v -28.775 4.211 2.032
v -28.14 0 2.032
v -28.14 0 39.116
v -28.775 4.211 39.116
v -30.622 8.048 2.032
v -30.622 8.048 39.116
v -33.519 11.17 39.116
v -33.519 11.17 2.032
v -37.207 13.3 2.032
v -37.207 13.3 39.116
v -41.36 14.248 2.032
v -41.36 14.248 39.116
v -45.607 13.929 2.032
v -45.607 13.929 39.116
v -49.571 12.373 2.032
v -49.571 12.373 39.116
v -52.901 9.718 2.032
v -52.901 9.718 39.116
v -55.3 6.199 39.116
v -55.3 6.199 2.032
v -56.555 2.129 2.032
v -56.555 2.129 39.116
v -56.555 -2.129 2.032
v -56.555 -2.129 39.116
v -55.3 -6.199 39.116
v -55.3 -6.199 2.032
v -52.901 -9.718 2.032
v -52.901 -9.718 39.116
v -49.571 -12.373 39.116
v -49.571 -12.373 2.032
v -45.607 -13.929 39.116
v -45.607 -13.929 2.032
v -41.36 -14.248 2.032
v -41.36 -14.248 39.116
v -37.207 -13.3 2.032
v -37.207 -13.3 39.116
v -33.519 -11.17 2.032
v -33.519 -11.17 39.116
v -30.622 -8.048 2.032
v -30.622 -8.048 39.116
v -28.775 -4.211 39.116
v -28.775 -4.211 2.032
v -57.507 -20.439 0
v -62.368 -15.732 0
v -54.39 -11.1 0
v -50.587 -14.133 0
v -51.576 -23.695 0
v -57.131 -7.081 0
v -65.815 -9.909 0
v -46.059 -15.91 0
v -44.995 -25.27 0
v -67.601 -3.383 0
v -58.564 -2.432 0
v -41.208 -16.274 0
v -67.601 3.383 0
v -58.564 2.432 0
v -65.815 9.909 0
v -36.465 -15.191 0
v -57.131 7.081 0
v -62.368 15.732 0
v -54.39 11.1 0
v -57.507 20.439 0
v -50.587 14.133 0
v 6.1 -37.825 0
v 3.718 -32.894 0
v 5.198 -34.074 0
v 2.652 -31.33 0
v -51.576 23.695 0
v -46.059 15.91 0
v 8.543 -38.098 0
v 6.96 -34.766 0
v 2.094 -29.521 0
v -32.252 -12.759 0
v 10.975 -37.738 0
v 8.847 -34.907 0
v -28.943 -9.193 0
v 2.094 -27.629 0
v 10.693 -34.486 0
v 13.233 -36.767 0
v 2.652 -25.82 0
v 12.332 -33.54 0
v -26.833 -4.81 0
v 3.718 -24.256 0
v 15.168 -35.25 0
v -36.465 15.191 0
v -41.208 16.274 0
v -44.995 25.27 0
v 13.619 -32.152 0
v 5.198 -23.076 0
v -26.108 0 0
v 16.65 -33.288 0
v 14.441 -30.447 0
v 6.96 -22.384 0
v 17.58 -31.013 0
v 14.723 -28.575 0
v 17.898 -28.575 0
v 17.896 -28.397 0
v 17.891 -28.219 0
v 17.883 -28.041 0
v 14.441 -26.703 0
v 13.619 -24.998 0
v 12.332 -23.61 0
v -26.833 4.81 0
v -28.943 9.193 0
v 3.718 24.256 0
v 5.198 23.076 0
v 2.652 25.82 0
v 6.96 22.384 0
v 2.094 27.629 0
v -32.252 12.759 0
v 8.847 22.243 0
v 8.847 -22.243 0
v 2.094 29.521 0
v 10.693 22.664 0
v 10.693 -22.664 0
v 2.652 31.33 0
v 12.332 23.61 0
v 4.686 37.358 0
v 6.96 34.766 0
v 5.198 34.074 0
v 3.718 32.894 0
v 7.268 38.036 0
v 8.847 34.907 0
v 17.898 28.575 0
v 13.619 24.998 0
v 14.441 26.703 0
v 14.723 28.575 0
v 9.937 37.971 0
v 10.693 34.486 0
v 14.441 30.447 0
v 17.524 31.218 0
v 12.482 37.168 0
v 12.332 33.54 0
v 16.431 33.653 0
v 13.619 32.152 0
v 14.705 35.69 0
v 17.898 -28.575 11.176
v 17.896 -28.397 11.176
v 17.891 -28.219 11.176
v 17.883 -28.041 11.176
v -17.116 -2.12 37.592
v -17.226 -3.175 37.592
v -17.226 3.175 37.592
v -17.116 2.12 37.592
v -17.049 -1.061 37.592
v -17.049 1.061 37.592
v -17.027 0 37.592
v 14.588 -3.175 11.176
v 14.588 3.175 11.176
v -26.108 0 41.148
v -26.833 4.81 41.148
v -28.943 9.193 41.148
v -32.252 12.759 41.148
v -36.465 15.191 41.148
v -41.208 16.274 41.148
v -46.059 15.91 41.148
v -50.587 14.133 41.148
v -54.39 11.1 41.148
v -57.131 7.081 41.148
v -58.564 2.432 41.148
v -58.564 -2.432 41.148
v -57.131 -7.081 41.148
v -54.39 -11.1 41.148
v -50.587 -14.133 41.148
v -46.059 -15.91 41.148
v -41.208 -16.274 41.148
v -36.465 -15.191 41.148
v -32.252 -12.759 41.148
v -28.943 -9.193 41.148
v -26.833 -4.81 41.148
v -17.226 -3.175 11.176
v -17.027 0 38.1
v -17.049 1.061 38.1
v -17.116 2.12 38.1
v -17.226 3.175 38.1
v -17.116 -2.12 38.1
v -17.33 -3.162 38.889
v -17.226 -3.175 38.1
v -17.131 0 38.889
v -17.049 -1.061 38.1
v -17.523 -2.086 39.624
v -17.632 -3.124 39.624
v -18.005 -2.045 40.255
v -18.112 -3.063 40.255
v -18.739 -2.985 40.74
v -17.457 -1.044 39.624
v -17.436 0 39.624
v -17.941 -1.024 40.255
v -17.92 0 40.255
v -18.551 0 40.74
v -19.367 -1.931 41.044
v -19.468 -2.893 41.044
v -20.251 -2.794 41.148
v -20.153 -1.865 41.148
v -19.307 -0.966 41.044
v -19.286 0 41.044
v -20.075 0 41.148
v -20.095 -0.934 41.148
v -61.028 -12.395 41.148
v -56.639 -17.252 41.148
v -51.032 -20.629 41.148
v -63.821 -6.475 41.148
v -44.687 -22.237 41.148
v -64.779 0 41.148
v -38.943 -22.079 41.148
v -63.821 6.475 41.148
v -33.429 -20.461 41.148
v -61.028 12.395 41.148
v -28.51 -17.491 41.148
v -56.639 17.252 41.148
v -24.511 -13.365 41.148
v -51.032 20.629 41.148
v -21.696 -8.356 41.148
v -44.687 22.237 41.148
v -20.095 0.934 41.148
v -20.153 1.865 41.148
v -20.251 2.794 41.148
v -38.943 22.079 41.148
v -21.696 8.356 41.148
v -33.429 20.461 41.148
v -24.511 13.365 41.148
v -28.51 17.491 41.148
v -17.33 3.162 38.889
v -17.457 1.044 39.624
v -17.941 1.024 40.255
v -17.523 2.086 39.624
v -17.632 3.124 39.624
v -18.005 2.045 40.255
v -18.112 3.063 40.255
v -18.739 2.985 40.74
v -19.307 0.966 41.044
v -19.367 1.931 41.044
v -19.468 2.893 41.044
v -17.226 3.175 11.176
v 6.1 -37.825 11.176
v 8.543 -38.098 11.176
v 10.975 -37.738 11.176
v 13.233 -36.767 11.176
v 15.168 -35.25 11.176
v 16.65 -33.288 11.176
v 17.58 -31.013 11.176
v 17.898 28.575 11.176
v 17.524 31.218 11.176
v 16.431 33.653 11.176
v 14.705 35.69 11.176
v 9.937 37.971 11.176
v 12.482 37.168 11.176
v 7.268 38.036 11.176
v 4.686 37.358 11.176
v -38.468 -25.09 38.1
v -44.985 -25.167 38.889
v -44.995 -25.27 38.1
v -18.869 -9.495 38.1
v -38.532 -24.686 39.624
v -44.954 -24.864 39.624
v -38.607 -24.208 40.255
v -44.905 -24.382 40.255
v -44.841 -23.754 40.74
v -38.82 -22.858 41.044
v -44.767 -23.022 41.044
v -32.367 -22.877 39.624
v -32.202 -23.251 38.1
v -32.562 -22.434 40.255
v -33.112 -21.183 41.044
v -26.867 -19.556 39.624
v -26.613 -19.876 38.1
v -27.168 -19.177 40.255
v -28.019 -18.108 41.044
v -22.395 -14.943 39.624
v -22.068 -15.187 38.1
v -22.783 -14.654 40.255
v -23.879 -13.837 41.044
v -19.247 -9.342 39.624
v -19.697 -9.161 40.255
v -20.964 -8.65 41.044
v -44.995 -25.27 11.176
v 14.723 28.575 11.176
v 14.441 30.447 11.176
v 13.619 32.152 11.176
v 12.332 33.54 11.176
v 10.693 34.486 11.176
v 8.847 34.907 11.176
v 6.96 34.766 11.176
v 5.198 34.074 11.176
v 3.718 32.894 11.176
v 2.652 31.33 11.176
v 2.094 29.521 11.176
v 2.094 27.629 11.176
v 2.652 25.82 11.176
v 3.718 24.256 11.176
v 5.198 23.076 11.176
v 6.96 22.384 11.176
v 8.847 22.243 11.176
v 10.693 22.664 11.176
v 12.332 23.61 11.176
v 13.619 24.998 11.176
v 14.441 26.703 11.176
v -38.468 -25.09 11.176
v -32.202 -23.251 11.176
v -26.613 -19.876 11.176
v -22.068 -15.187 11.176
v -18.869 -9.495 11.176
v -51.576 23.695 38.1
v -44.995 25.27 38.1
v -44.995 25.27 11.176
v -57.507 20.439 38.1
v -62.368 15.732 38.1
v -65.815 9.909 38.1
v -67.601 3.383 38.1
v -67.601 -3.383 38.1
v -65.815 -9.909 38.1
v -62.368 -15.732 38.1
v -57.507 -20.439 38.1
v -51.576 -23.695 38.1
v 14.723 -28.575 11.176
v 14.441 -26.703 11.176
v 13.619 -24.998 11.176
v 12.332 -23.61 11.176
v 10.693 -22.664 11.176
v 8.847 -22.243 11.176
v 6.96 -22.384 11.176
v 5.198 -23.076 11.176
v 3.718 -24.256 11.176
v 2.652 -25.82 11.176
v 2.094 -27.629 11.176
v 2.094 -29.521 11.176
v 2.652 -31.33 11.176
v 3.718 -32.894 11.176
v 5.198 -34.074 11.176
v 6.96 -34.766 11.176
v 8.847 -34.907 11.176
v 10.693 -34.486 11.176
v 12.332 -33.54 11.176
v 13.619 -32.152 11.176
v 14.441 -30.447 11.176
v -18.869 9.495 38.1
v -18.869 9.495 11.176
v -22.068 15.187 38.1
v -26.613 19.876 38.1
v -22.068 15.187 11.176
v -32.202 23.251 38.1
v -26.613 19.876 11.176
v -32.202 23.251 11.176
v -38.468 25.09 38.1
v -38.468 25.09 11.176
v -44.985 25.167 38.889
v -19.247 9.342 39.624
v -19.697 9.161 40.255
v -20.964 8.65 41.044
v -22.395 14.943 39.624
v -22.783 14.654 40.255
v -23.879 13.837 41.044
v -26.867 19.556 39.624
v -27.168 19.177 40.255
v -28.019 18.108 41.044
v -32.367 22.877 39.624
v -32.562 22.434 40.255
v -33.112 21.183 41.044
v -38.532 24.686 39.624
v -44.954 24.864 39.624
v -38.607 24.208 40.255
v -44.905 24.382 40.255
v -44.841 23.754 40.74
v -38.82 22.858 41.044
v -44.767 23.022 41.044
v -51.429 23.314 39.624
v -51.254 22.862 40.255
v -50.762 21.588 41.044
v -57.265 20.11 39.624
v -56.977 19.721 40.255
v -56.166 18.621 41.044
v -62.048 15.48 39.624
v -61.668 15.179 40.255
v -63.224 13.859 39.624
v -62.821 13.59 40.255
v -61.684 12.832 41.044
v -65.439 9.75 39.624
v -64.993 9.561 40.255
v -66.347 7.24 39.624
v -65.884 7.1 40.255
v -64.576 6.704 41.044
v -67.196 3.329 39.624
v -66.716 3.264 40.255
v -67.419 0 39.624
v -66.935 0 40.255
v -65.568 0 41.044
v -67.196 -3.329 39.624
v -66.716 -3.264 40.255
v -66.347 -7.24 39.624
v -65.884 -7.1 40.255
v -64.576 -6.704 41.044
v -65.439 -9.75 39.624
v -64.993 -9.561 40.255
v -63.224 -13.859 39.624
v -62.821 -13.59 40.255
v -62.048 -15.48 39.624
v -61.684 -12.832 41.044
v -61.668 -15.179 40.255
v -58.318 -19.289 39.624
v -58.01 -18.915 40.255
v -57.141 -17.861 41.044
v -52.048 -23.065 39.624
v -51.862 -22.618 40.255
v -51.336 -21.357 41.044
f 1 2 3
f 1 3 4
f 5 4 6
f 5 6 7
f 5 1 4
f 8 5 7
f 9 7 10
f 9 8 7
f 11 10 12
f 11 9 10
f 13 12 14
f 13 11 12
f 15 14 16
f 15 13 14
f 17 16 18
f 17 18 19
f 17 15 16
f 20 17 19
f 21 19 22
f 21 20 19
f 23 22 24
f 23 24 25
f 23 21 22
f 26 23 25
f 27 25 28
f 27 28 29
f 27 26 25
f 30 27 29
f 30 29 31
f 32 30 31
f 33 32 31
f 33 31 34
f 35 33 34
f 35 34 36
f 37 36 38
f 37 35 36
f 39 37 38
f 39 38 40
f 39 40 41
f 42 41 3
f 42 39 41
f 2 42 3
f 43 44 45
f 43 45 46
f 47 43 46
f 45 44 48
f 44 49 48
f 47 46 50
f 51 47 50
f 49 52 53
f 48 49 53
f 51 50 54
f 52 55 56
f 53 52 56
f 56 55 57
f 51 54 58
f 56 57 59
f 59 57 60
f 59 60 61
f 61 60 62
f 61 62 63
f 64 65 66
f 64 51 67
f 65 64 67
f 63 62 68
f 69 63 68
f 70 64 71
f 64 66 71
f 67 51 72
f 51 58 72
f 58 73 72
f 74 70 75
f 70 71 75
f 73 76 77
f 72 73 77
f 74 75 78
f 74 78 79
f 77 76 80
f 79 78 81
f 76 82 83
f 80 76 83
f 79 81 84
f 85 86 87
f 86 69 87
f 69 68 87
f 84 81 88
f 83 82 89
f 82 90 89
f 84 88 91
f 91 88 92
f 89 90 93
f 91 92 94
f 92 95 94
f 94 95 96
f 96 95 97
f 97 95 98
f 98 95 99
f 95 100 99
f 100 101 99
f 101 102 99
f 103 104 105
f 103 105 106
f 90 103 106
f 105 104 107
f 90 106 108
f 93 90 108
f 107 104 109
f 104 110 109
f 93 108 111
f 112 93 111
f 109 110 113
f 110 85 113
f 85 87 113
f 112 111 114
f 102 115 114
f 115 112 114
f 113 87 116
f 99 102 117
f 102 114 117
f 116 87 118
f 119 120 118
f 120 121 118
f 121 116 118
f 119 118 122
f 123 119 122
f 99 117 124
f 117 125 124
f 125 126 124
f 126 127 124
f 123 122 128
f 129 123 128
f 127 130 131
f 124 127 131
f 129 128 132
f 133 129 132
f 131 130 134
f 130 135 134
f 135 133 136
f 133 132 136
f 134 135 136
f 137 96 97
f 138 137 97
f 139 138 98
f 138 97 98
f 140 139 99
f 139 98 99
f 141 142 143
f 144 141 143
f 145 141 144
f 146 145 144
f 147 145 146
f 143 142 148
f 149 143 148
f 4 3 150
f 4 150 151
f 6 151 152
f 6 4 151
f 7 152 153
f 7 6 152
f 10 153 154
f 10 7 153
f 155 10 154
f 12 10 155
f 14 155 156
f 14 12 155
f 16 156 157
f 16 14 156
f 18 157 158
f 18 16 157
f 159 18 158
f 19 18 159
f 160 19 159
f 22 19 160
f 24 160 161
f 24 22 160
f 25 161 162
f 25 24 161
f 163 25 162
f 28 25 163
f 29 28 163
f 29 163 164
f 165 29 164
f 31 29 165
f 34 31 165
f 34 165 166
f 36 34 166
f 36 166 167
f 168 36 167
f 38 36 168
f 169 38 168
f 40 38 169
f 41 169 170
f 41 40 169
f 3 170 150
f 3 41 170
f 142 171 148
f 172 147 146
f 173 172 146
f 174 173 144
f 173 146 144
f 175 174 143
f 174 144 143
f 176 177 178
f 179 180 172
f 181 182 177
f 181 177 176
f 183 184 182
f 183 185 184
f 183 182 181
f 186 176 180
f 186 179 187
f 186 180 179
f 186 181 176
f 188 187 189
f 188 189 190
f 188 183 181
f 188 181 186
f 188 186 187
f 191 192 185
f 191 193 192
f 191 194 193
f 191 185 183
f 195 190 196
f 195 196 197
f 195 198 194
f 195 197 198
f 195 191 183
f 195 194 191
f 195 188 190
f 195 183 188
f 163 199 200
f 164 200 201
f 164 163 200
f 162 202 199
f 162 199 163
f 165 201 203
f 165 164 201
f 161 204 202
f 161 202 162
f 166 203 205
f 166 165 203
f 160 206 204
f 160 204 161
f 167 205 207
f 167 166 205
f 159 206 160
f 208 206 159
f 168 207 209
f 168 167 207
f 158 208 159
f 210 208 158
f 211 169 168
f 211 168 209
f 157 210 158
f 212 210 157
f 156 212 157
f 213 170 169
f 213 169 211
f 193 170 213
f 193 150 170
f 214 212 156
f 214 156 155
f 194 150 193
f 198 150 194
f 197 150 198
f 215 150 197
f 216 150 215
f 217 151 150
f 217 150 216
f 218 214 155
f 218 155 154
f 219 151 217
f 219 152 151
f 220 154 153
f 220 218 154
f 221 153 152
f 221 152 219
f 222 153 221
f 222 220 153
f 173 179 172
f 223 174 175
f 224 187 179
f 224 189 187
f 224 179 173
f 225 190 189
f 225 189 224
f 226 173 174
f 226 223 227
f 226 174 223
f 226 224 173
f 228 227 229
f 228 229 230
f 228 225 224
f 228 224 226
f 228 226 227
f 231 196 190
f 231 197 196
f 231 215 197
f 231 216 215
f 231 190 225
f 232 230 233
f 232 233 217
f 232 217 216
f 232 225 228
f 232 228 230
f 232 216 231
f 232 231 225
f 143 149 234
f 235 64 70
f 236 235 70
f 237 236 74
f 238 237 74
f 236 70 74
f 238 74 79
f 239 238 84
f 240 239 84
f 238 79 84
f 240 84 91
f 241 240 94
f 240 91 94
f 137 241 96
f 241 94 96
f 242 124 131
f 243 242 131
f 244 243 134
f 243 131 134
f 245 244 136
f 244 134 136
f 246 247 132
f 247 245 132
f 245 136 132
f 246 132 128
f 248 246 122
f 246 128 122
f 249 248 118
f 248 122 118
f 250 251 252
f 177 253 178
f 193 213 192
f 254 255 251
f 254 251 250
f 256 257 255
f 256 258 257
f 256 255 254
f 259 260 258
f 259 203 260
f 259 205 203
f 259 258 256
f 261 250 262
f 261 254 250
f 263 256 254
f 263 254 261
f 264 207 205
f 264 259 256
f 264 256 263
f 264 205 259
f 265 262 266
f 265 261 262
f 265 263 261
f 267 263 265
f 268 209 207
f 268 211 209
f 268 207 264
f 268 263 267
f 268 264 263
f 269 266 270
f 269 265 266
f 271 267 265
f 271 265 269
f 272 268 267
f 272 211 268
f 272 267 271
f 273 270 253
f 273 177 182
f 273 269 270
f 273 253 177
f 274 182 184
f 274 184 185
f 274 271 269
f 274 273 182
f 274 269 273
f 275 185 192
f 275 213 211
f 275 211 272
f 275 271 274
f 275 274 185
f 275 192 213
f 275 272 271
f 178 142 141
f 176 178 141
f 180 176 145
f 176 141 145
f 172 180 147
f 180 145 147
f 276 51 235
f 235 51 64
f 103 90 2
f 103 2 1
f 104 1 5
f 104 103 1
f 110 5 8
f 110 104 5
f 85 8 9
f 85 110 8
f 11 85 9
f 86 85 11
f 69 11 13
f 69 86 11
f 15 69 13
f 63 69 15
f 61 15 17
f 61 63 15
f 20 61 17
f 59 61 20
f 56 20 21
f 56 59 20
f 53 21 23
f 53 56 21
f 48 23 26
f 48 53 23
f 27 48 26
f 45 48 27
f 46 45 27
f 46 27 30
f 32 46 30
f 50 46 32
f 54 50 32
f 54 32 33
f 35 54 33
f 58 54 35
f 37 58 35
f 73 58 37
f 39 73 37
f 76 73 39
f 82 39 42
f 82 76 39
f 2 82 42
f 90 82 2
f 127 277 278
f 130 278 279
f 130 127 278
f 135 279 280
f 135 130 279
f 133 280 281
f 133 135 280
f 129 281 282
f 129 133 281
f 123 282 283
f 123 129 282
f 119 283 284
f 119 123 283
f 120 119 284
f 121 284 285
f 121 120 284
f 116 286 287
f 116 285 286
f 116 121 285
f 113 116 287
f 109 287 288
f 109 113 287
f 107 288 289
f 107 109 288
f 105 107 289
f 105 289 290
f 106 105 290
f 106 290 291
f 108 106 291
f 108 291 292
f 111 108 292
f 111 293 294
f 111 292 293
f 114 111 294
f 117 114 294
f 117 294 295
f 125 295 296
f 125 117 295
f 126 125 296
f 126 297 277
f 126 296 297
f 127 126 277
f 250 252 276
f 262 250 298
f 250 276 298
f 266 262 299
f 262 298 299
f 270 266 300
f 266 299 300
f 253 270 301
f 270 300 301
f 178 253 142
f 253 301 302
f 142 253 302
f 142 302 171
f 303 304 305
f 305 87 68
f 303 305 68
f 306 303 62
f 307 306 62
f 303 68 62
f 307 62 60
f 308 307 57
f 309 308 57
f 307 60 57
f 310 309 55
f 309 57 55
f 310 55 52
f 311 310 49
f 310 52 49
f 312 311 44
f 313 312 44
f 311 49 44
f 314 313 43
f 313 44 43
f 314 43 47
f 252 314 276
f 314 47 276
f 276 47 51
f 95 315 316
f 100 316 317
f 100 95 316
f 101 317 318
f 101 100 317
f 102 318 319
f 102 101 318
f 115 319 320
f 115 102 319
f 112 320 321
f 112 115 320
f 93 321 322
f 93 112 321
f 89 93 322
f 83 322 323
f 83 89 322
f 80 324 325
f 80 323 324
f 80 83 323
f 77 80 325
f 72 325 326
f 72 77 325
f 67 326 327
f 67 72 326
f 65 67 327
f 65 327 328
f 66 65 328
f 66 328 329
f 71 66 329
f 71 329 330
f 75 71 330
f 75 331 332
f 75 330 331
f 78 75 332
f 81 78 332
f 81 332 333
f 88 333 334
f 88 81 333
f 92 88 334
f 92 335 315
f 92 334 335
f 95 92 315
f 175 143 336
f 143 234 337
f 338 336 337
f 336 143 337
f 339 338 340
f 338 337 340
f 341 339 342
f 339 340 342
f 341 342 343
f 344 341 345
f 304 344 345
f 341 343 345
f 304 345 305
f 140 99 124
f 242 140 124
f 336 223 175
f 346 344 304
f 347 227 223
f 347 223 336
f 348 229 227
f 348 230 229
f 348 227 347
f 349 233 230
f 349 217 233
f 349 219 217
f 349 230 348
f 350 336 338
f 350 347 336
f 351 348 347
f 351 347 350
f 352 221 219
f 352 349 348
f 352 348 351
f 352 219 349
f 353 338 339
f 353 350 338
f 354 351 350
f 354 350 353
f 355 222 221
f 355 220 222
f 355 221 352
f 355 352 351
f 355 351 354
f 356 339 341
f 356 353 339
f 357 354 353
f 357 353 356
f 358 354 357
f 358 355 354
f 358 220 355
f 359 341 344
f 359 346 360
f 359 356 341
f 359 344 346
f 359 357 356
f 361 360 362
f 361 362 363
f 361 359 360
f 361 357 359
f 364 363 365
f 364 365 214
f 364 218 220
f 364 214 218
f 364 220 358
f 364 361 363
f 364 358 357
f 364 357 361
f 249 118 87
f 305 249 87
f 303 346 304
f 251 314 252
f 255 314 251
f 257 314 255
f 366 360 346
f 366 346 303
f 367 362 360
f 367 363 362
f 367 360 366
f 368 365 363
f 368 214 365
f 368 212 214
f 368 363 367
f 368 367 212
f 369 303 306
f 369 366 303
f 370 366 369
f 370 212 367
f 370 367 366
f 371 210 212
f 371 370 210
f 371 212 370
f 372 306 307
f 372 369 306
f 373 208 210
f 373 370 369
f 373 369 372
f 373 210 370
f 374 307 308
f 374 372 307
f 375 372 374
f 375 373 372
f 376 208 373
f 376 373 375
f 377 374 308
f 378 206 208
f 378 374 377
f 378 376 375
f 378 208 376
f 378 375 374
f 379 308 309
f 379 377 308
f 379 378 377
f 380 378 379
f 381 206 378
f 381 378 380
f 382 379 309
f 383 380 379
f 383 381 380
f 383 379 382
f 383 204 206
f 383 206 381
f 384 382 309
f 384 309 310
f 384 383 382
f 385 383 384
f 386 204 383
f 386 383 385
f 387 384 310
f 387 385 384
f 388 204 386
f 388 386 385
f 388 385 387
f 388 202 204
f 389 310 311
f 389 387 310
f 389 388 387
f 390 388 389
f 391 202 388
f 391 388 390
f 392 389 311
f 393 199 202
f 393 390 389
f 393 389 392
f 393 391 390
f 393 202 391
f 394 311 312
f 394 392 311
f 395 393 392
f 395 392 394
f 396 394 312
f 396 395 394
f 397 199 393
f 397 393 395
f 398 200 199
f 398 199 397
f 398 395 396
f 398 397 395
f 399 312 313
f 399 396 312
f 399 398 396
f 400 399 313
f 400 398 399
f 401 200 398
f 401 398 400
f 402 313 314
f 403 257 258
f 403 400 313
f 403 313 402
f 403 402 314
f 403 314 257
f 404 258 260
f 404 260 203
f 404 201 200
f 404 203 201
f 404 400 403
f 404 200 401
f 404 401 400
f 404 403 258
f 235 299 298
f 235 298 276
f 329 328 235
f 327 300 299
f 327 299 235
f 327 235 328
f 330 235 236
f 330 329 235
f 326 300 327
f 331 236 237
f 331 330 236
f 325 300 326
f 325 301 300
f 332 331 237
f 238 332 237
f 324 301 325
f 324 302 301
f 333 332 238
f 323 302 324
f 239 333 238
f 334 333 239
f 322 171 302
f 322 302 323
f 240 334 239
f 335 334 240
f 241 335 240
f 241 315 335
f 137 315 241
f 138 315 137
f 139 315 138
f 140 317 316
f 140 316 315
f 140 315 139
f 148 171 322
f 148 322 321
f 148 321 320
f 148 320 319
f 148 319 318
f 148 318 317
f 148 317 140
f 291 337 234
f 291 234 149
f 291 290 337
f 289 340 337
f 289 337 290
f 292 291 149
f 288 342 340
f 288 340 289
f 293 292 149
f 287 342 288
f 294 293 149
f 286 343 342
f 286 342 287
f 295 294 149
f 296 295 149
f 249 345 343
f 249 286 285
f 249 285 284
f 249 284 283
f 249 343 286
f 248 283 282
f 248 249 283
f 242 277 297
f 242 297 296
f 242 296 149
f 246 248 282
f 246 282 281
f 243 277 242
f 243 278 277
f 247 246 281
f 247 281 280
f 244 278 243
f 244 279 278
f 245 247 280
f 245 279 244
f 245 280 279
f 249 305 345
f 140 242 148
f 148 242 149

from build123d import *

# Parameters (mm, degrees)
F0_R     = 14.2875
F1_DEPTH = 41.148
F0_R_2   = 6.35
F2_DEPTH = 11.176
F3_DEPTH = 37.592
F5_DEPTH = 127
F6_DEPTH = 76.2
F7_R     = 3.048
F8_SIZE2 = 2.032
F8_SIZE  = 2.032
F9_SIZE2 = 2.032
F9_SIZE  = 2.032


# Not quite as in the source:
# - ends of sketch curves that miss each other by under 0.0002 mm in the source are joined


with BuildPart() as f1:
    # F0 (on Top) → F1 (new body)
    with BuildSketch(Plane.XY):
        with BuildLine():
            ThreePointArc((-17.226482478, 3.175), (-26.6125443992, 19.8759818106), (-44.9953409853, 25.2698432749))
            ThreePointArc((-44.9953409853, 25.2698432749), (-67.8272637159, 0), (-44.9953409853, -25.2698432749))
            ThreePointArc((-44.9953409853, -25.2698432749), (-26.6125443992, -19.8759818106), (-17.226482478, -3.175))
            Line((-17.226482478, -3.175), (-23.8334226287, -3.175))
            Line((-23.8334226287, -3.175), (-23.8334226287, 3.175))
            Line((-23.8334226287, 3.175), (-17.226482478, 3.175))
        make_face()
        with Locations((-42.4272637159, 0)):
            Circle(F0_R, mode=Mode.SUBTRACT)
        with BuildLine():
            ThreePointArc((-17.0272637159, 0), (-17.0771173313, 1.5906219786), (-17.226482478, 3.175))
            Line((-17.226482478, 3.175), (-23.8334226287, 3.175))
            Line((-23.8334226287, 3.175), (-23.8334226287, -3.175))
            Line((-23.8334226287, -3.175), (-17.226482478, -3.175))
            ThreePointArc((-17.226482478, -3.175), (-17.0771173313, -1.5906219786), (-17.0272637159, 0))
        make_face()
    extrude(amount=F1_DEPTH)

    # F0 (on Top) → F2 (join)
    with BuildSketch(Plane.XY):
        with BuildLine():
            Line((4.6864668266, 37.3577696364), (-44.9953409853, 25.2698432749))
            ThreePointArc((-44.9953409853, 25.2698432749), (-26.6125443992, 19.8759818106), (-17.226482478, 3.175))
            Line((-17.226482478, 3.175), (14.5881694606, 3.175))
            Line((14.5881694606, 3.175), (14.5881694606, -3.175))
            Line((14.5881694606, -3.175), (-17.226482478, -3.175))
            ThreePointArc((-17.226482478, -3.175), (-26.6125443992, -19.8759818106), (-44.9953409853, -25.2698432749))
            Line((-44.9953409853, -25.2698432749), (6.0998825197, -37.8248519321))
            ThreePointArc((6.0998825197, -37.8248519321), (2.2878291463, -21.247003676), (17.8827435435, -28.0407838216))
            Line((17.8827435435, -28.0407838216), (17.8977366181, 28.575))
            ThreePointArc((17.8977366181, 28.575), (3.0995063243, 20.6428709799), (4.6864668266, 37.3577696364))
        make_face()
        with BuildLine():
            ThreePointArc((17.8827435435, -28.0407838216), (2.2878291463, -21.247003676), (6.0998825197, -37.8248519321))
            ThreePointArc((6.0998825197, -37.8248519321), (14.2496697061, -36.0708174039), (17.8977362841, -28.575))
            ThreePointArc((17.8977362841, -28.575), (17.8939873612, -28.307786739), (17.8827435435, -28.0407838216))
        make_face()
        with Locations((8.3727362841, -28.575)):
            Circle(F0_R_2, mode=Mode.SUBTRACT)
        with BuildLine():
            ThreePointArc((4.6864668266, 37.3577696364), (3.0995063243, 20.6428709799), (17.8977362841, 28.575))
            ThreePointArc((17.8977362841, 28.575), (13.6459662439, 36.5071290201), (4.6864668266, 37.3577696364))
        make_face()
        with Locations((8.3727362841, 28.575)):
            Circle(F0_R_2, mode=Mode.SUBTRACT)
        with BuildLine():
            Line((14.5881694606, 3.175), (-17.226482478, 3.175))
            ThreePointArc((-17.226482478, 3.175), (-17.0771173313, 1.5906219786), (-17.0272637159, 0))
            ThreePointArc((-17.0272637159, 0), (-17.0771173313, -1.5906219786), (-17.226482478, -3.175))
            Line((-17.226482478, -3.175), (14.5881694606, -3.175))
            Line((14.5881694606, -3.175), (14.5881694606, 3.175))
        make_face()
        with Locations((8.3727362841, 28.575)):
            Circle(F0_R_2)
        with Locations((8.3727362841, -28.575)):
            Circle(F0_R_2)
        with BuildLine():
            ThreePointArc((-17.0272637159, 0), (-17.0771173313, 1.5906219786), (-17.226482478, 3.175))
            Line((-17.226482478, 3.175), (-23.8334226287, 3.175))
            Line((-23.8334226287, 3.175), (-23.8334226287, -3.175))
            Line((-23.8334226287, -3.175), (-17.226482478, -3.175))
            ThreePointArc((-17.226482478, -3.175), (-17.0771173313, -1.5906219786), (-17.0272637159, 0))
        make_face()
    extrude(amount=F2_DEPTH)

    # F0 (on Top) → F3 (join)
    with BuildSketch(Plane.XY):
        with BuildLine():
            Line((14.5881694606, 3.175), (-17.226482478, 3.175))
            ThreePointArc((-17.226482478, 3.175), (-17.0771173313, 1.5906219786), (-17.0272637159, 0))
            ThreePointArc((-17.0272637159, 0), (-17.0771173313, -1.5906219786), (-17.226482478, -3.175))
            Line((-17.226482478, -3.175), (14.5881694606, -3.175))
            Line((14.5881694606, -3.175), (14.5881694606, 3.175))
        make_face()
    extrude(amount=F3_DEPTH)

    # F4 (on face) → F5 (cut)
    with BuildSketch(Plane.XZ.offset(3.175)):
        Polygon((14.5881694606, 37.592), (-17.226482478, 37.592), (14.5881694606, 11.176), align=None)
    extrude(amount=-F5_DEPTH, mode=Mode.SUBTRACT)

    # F0 (on Top) → F6 (cut)
    with BuildSketch(Plane.XY):
        with Locations((8.3727362841, 28.575)):
            Circle(F0_R_2)
        with Locations((8.3727362841, -28.575)):
            Circle(F0_R_2)
    extrude(amount=F6_DEPTH, mode=Mode.SUBTRACT)

    # F7
    f7_edges = [f1.edges().sort_by_distance(p)[0] for p in [
        (-39.859186, -25.269843, 41.148),
    ]]
    fillet(f7_edges, radius=F7_R)

    # F8
    f8_edges = [f1.edges().sort_by_distance(p)[0] for p in [
        (-56.714764, 0, 41.148),
        (-40.167356, -22.237462, 41.148),
    ]]
    chamfer(f8_edges, length=F8_SIZE, length2=F8_SIZE2)

    # F9
    f9_edges = [f1.edges().sort_by_distance(p)[0] for p in [
        (-56.714764, 0, 0),
    ]]
    chamfer(f9_edges, length=F9_SIZE, length2=F9_SIZE2)


solid = f1.part
